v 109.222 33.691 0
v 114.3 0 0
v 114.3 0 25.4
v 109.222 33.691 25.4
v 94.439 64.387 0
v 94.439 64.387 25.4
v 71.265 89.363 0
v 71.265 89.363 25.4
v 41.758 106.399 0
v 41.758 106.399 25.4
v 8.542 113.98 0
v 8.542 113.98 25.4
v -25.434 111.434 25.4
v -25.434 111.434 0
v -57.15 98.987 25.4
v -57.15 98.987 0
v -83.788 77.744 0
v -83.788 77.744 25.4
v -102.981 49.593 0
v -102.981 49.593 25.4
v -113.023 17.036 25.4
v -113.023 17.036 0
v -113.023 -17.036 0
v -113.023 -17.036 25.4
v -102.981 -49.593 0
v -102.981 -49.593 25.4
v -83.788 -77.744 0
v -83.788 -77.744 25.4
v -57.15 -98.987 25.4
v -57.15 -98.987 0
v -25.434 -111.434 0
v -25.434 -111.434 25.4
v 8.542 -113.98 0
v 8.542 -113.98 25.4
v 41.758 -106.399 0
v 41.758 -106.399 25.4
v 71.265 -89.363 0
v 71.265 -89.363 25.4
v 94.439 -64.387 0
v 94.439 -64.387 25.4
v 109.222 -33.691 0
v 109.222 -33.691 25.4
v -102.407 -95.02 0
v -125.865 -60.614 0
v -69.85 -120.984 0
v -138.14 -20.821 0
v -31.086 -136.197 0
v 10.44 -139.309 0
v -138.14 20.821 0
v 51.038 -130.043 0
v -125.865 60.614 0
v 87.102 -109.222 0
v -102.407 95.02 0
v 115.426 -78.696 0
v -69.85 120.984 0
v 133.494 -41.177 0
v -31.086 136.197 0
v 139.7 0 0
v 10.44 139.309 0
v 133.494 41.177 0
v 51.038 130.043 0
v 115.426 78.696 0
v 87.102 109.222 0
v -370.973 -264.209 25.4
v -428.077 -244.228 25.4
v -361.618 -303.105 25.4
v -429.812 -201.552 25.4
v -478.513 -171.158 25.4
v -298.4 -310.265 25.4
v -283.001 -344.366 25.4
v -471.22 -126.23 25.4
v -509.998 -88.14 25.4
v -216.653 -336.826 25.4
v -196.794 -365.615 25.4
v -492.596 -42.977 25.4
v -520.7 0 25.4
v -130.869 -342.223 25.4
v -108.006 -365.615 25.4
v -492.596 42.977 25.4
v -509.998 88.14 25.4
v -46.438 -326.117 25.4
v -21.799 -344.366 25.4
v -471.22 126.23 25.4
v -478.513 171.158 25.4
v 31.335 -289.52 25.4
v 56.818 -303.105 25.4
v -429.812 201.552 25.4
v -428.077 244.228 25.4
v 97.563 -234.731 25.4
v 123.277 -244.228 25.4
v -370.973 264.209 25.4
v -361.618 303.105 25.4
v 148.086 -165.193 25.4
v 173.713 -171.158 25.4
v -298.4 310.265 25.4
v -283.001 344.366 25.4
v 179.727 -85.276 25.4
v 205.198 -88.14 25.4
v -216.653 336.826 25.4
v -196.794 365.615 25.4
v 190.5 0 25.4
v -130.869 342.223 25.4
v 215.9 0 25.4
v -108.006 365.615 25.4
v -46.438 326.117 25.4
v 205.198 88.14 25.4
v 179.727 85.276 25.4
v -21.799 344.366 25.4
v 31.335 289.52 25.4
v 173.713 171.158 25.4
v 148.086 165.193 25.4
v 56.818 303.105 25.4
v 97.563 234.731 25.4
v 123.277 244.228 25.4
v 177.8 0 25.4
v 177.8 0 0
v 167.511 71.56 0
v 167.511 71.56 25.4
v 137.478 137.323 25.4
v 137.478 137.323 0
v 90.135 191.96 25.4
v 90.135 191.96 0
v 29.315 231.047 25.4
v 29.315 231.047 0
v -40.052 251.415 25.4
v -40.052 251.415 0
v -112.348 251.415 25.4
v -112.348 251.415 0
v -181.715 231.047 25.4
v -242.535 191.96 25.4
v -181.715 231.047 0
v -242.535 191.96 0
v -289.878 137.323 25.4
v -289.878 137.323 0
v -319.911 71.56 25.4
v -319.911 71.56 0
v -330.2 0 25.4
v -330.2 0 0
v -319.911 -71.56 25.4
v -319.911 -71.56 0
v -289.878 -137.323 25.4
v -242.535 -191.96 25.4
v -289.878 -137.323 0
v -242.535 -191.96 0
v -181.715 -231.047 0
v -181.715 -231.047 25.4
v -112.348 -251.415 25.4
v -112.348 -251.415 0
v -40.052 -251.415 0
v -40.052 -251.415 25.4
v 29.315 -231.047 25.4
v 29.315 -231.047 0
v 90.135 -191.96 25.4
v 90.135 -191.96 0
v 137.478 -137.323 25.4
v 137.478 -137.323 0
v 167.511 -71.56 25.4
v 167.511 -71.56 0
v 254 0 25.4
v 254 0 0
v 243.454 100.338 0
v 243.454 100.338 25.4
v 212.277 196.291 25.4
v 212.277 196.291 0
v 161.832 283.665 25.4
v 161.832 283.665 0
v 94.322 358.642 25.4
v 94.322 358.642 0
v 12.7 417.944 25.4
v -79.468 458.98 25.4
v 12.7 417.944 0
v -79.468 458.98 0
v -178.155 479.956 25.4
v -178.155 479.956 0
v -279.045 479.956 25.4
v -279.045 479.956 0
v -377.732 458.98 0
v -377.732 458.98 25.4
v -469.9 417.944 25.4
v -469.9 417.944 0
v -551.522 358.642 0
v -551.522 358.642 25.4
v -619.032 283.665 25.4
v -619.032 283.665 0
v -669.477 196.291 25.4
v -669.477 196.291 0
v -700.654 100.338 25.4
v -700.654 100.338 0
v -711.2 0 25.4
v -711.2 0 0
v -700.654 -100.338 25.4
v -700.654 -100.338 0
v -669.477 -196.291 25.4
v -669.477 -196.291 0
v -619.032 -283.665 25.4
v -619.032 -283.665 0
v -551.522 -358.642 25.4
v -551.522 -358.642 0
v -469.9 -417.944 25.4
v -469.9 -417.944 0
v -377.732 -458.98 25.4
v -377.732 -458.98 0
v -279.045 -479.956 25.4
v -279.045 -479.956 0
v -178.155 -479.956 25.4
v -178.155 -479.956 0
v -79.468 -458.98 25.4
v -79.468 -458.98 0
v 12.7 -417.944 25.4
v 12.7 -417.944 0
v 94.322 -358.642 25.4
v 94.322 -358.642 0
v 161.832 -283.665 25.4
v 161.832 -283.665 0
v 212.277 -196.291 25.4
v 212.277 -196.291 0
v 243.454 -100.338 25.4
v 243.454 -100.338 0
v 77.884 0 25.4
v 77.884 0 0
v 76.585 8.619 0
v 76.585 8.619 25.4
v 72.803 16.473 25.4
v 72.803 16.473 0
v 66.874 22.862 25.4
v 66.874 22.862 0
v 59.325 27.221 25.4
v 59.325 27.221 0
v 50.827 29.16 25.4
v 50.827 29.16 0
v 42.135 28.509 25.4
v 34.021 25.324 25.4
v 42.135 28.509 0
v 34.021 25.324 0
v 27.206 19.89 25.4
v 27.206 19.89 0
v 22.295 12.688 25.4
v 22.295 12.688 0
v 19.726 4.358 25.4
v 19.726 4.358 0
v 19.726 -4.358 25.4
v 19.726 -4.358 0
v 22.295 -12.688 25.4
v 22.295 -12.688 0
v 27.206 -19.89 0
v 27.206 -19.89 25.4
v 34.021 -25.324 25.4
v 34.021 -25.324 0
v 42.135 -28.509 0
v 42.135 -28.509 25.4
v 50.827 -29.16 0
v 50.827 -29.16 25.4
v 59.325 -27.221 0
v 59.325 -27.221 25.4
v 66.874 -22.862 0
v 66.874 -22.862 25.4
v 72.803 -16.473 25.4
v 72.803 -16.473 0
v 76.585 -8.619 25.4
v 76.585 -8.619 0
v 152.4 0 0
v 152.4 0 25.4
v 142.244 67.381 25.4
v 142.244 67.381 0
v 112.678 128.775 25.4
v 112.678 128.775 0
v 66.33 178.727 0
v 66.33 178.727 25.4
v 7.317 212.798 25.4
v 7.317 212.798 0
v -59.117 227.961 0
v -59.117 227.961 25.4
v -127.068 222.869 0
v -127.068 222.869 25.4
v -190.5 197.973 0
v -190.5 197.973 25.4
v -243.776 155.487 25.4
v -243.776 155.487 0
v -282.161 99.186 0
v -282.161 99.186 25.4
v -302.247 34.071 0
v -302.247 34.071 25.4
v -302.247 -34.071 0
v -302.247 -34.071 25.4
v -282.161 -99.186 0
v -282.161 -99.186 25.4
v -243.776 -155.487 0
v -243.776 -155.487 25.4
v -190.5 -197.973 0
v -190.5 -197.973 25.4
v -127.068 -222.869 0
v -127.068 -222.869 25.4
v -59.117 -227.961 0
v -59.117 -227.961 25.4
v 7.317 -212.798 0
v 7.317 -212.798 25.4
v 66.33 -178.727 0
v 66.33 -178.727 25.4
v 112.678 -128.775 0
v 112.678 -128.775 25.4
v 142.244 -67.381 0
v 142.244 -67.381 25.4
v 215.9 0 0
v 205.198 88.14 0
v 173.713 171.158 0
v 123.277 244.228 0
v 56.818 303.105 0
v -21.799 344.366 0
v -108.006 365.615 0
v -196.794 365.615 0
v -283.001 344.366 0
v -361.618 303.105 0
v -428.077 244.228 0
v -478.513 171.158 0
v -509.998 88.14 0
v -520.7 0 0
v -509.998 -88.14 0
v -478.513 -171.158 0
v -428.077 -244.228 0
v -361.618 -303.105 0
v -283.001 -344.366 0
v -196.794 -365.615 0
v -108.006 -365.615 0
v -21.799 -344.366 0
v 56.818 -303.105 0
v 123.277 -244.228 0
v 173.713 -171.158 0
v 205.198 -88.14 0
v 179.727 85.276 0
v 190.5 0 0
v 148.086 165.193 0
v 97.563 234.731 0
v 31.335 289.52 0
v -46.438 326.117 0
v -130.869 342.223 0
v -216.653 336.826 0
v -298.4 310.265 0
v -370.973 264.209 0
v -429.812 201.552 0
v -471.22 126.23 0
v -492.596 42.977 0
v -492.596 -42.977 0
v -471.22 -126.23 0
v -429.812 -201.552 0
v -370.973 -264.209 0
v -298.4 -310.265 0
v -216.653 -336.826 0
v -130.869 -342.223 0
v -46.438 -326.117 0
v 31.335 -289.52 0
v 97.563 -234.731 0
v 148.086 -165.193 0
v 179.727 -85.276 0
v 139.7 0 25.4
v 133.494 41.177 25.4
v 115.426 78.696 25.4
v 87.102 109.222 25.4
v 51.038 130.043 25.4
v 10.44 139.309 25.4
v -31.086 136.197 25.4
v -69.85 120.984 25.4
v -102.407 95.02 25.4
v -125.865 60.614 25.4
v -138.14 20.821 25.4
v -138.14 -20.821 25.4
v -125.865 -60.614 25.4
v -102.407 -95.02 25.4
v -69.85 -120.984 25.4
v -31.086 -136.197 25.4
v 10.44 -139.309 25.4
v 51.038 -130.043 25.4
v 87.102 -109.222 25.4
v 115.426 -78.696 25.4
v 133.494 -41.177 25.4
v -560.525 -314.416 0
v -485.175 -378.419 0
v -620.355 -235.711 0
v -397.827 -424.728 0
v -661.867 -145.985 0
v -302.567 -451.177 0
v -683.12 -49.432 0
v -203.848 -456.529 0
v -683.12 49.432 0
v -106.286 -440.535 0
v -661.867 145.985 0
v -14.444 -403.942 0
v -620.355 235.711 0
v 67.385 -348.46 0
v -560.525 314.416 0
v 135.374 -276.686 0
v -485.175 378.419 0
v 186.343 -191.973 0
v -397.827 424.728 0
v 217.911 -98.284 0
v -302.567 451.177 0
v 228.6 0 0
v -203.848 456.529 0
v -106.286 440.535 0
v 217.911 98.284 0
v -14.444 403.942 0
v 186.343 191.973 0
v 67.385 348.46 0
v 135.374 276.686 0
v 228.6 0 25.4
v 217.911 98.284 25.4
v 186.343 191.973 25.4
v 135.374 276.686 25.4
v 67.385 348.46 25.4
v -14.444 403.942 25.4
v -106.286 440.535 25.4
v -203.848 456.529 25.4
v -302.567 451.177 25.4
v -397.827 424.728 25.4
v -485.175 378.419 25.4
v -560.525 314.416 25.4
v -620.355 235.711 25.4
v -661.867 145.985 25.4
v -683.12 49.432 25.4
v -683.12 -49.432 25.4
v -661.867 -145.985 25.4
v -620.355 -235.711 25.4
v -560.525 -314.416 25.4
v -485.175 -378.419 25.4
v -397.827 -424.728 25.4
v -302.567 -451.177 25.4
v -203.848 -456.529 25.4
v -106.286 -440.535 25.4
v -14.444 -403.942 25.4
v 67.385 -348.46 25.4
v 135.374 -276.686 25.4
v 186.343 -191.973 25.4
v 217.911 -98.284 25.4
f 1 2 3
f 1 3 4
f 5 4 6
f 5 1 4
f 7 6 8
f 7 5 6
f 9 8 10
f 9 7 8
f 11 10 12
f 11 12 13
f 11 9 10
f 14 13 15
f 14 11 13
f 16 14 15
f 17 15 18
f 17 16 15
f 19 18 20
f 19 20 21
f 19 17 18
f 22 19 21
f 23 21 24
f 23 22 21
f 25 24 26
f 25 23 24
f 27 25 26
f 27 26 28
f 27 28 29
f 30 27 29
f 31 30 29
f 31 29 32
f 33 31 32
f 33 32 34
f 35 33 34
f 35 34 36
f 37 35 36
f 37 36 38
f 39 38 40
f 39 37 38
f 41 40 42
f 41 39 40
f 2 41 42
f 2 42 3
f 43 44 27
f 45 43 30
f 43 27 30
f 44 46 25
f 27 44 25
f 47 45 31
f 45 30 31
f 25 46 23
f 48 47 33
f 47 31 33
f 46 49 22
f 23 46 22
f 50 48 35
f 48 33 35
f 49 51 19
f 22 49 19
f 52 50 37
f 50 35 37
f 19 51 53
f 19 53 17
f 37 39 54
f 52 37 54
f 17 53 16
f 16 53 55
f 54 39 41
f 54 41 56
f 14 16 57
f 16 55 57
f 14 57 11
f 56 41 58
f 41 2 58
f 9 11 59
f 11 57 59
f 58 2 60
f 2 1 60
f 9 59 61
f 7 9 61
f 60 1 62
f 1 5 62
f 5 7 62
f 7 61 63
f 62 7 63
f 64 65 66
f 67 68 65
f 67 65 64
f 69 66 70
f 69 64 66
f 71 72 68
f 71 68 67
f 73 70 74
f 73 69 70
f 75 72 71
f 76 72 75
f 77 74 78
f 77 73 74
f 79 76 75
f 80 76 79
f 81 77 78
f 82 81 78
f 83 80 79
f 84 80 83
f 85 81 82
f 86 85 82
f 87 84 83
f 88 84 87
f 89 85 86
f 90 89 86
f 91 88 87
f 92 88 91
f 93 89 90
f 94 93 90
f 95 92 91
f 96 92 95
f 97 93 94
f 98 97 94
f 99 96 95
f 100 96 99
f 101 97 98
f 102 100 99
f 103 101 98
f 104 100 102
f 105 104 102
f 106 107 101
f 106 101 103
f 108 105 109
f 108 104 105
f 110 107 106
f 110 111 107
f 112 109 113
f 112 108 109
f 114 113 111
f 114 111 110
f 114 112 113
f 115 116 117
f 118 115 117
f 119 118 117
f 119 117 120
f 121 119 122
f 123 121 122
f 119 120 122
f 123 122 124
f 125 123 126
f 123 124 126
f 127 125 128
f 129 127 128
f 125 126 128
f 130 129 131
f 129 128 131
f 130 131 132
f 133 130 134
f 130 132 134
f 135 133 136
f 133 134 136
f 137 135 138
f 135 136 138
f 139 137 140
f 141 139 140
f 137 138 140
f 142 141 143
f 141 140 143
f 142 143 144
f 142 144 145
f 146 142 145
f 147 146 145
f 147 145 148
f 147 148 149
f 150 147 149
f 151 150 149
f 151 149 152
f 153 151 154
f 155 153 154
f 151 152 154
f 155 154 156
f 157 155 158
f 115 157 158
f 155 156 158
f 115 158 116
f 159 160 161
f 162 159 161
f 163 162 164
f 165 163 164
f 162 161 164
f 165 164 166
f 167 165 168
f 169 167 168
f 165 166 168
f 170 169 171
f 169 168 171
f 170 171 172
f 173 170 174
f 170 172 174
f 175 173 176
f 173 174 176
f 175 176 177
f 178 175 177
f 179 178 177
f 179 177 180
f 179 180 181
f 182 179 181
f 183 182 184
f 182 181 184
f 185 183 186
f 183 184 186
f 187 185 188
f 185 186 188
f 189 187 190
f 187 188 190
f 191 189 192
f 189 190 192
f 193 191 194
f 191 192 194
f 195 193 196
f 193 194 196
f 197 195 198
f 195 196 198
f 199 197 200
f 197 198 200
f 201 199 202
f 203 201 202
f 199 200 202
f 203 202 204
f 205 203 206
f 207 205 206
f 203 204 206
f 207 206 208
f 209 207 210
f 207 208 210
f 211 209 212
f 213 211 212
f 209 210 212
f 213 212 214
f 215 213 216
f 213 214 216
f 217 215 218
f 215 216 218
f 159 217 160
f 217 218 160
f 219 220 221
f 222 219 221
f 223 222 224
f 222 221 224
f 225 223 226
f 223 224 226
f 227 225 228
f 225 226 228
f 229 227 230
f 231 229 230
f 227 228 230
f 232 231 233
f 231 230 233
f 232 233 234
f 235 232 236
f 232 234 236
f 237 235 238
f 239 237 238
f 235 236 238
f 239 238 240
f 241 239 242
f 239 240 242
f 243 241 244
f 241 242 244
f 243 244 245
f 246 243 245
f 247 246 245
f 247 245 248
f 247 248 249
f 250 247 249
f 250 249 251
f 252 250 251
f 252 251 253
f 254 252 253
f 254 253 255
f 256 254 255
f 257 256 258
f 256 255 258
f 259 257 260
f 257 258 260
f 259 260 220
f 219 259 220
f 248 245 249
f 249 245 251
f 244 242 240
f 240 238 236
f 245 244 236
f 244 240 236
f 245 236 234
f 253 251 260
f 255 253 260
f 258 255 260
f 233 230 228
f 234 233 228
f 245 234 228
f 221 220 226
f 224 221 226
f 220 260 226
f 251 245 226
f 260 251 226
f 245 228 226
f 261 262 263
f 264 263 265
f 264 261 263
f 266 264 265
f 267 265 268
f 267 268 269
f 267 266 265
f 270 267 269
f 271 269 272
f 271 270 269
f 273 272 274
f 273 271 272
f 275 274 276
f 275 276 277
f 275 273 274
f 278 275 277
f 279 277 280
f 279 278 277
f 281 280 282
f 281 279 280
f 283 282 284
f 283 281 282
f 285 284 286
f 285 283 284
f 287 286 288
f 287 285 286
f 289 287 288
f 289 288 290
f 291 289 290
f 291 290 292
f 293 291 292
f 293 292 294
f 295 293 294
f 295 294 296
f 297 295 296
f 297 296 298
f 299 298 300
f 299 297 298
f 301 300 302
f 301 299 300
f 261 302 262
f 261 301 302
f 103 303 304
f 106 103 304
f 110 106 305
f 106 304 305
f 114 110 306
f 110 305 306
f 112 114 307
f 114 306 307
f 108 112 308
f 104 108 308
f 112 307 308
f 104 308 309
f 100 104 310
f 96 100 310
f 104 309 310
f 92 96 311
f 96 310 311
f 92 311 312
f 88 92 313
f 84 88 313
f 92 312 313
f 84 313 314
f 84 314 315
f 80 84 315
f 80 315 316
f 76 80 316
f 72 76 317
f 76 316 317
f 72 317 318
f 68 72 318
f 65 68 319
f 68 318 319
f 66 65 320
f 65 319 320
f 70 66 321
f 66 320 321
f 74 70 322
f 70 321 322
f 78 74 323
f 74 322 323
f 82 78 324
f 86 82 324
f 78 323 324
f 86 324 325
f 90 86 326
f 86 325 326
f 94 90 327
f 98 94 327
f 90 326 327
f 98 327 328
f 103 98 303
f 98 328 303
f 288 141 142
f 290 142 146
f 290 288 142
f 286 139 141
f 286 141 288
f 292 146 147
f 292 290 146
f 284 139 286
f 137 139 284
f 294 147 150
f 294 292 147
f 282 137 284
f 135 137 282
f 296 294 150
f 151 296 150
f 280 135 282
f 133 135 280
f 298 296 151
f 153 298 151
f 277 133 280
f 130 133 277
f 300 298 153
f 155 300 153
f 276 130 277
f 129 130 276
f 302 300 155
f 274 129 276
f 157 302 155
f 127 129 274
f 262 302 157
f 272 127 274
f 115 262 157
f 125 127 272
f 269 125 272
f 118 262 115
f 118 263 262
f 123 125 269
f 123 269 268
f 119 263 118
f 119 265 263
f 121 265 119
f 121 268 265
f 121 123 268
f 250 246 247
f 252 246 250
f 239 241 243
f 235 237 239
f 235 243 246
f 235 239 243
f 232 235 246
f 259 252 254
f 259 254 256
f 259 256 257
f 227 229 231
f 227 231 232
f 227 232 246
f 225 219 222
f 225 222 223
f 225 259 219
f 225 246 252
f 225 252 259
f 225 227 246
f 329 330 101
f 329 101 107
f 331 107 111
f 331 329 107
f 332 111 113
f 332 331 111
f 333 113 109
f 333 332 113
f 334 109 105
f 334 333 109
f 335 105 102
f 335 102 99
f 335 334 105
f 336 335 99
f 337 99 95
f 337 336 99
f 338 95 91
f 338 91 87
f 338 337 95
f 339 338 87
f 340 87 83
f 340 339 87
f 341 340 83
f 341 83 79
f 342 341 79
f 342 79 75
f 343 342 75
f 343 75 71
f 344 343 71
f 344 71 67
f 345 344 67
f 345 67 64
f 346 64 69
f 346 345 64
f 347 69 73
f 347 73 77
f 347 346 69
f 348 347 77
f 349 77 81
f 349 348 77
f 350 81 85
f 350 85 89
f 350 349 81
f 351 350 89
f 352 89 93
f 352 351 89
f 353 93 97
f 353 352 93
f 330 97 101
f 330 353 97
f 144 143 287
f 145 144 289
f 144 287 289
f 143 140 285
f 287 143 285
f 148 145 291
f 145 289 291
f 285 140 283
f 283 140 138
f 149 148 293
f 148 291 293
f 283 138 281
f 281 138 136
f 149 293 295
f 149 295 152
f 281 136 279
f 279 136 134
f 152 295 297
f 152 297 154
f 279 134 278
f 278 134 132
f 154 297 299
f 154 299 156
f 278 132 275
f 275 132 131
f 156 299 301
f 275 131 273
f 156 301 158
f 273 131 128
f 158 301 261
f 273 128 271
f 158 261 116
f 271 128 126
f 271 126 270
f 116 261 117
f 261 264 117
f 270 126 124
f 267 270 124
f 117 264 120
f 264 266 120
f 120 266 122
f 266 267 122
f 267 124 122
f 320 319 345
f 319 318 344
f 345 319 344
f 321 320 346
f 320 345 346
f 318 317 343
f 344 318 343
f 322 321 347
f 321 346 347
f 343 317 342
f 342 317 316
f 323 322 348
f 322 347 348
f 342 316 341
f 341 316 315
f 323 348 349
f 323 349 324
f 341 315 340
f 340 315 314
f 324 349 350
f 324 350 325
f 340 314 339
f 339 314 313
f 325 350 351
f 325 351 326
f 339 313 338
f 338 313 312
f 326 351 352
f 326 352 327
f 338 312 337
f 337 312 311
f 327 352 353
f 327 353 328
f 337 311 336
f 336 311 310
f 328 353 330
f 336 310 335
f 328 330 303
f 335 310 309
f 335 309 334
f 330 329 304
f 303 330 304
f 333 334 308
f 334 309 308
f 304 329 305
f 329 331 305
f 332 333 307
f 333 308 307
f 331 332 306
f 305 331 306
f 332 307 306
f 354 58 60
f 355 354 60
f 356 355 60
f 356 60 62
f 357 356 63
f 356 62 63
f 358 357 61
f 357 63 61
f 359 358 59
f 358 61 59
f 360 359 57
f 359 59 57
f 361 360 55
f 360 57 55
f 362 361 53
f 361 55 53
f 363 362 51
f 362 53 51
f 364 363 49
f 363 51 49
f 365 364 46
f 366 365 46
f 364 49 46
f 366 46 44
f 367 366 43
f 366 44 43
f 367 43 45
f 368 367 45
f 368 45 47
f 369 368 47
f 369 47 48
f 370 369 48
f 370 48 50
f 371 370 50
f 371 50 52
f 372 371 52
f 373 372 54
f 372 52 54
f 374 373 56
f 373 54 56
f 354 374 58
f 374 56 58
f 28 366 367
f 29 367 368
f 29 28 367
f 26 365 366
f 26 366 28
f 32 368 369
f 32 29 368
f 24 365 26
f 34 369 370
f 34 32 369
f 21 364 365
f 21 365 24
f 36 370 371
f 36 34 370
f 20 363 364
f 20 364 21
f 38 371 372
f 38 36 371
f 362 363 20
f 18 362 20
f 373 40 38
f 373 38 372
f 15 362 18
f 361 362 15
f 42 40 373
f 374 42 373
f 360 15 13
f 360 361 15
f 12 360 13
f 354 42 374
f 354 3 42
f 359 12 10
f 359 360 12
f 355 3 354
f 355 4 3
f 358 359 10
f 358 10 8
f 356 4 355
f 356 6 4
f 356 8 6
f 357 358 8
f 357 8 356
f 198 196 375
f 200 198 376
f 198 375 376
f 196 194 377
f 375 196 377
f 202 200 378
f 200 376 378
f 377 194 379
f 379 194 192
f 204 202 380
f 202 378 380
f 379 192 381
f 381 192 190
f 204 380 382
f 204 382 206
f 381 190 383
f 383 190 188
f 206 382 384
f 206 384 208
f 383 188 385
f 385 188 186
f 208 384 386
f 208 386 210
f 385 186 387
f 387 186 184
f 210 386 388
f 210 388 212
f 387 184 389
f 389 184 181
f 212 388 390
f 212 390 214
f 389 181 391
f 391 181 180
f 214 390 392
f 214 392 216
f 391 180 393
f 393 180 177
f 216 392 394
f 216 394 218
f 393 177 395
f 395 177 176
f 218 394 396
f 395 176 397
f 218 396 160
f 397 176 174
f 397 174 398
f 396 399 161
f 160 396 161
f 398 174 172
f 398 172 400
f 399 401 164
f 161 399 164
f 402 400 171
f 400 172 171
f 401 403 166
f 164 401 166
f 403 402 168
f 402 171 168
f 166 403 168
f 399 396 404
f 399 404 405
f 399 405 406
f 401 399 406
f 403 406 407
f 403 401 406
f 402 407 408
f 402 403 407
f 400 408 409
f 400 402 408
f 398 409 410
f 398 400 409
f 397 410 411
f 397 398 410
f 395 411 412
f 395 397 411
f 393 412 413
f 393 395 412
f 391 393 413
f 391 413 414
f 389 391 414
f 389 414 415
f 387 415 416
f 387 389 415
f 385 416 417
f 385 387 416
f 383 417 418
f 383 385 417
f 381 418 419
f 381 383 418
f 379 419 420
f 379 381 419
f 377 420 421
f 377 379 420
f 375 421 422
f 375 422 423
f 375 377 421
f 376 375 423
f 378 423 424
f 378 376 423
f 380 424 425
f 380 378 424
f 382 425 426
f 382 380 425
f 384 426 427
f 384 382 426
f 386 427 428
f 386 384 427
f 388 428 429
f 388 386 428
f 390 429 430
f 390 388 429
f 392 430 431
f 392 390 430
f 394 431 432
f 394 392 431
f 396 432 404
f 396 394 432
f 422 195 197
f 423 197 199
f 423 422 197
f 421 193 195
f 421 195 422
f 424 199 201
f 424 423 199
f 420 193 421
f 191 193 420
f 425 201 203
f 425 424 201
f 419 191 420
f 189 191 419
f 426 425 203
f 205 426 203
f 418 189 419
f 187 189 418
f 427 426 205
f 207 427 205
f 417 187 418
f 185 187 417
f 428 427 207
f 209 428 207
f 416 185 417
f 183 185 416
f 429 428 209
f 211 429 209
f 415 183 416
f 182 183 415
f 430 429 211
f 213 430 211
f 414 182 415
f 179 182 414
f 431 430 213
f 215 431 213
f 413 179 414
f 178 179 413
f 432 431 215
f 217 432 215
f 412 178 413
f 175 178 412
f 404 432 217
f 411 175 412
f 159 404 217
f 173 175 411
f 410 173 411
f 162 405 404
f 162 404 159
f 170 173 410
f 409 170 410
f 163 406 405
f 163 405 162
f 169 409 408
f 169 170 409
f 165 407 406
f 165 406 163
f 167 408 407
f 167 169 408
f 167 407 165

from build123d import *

# Parameters (mm, degrees)
F0_R     = 482.6
F0_R_2   = 457.2
F0_R_3   = 368.3
F0_R_4   = 342.9
F0_R_5   = 254
F0_R_6   = 228.6
F1_DEPTH = 25.4
F0_R_7   = 139.7
F0_R_8   = 114.3
F2_DEPTH = 25.4
F3_DEPTH = 25.4
F0_R_9   = 29.242045
F4_DEPTH = 25.4


with BuildPart() as f1:
    # F0 (on Top) → F1 (new body)
    with BuildSketch(Plane.XY):
        with Locations((-228.6, 0)):
            Circle(F0_R)
        with Locations((-228.6, 0)):
            Circle(F0_R_2, mode=Mode.SUBTRACT)
        with Locations((-152.4, 0)):
            Circle(F0_R_3)
        with Locations((-152.4, 0)):
            Circle(F0_R_4, mode=Mode.SUBTRACT)
        with Locations((-76.2, 0)):
            Circle(F0_R_5)
        with Locations((-76.2, 0)):
            Circle(F0_R_6, mode=Mode.SUBTRACT)
    extrude(amount=F1_DEPTH)

    # F0 (on Top) → F3 (join)
    with BuildSketch(Plane.XY):
        with Locations((-228.6, 0)):
            Circle(F0_R)
        with Locations((-228.6, 0)):
            Circle(F0_R_2, mode=Mode.SUBTRACT)
    extrude(amount=F3_DEPTH)


with BuildPart() as f2:
    # F0 (on Top) → F2 (new body)
    with BuildSketch(Plane.XY):
        Circle(F0_R_7)
        Circle(F0_R_8, mode=Mode.SUBTRACT)
    extrude(amount=F2_DEPTH)


with BuildPart() as f4:
    # F0 (on Top) → F4 (new body)
    with BuildSketch(Plane.XY):
        with Locations((48.641667, 0)):
            Circle(F0_R_9)
    extrude(amount=F4_DEPTH)


solid = Compound([f1.part, f2.part, f4.part])
